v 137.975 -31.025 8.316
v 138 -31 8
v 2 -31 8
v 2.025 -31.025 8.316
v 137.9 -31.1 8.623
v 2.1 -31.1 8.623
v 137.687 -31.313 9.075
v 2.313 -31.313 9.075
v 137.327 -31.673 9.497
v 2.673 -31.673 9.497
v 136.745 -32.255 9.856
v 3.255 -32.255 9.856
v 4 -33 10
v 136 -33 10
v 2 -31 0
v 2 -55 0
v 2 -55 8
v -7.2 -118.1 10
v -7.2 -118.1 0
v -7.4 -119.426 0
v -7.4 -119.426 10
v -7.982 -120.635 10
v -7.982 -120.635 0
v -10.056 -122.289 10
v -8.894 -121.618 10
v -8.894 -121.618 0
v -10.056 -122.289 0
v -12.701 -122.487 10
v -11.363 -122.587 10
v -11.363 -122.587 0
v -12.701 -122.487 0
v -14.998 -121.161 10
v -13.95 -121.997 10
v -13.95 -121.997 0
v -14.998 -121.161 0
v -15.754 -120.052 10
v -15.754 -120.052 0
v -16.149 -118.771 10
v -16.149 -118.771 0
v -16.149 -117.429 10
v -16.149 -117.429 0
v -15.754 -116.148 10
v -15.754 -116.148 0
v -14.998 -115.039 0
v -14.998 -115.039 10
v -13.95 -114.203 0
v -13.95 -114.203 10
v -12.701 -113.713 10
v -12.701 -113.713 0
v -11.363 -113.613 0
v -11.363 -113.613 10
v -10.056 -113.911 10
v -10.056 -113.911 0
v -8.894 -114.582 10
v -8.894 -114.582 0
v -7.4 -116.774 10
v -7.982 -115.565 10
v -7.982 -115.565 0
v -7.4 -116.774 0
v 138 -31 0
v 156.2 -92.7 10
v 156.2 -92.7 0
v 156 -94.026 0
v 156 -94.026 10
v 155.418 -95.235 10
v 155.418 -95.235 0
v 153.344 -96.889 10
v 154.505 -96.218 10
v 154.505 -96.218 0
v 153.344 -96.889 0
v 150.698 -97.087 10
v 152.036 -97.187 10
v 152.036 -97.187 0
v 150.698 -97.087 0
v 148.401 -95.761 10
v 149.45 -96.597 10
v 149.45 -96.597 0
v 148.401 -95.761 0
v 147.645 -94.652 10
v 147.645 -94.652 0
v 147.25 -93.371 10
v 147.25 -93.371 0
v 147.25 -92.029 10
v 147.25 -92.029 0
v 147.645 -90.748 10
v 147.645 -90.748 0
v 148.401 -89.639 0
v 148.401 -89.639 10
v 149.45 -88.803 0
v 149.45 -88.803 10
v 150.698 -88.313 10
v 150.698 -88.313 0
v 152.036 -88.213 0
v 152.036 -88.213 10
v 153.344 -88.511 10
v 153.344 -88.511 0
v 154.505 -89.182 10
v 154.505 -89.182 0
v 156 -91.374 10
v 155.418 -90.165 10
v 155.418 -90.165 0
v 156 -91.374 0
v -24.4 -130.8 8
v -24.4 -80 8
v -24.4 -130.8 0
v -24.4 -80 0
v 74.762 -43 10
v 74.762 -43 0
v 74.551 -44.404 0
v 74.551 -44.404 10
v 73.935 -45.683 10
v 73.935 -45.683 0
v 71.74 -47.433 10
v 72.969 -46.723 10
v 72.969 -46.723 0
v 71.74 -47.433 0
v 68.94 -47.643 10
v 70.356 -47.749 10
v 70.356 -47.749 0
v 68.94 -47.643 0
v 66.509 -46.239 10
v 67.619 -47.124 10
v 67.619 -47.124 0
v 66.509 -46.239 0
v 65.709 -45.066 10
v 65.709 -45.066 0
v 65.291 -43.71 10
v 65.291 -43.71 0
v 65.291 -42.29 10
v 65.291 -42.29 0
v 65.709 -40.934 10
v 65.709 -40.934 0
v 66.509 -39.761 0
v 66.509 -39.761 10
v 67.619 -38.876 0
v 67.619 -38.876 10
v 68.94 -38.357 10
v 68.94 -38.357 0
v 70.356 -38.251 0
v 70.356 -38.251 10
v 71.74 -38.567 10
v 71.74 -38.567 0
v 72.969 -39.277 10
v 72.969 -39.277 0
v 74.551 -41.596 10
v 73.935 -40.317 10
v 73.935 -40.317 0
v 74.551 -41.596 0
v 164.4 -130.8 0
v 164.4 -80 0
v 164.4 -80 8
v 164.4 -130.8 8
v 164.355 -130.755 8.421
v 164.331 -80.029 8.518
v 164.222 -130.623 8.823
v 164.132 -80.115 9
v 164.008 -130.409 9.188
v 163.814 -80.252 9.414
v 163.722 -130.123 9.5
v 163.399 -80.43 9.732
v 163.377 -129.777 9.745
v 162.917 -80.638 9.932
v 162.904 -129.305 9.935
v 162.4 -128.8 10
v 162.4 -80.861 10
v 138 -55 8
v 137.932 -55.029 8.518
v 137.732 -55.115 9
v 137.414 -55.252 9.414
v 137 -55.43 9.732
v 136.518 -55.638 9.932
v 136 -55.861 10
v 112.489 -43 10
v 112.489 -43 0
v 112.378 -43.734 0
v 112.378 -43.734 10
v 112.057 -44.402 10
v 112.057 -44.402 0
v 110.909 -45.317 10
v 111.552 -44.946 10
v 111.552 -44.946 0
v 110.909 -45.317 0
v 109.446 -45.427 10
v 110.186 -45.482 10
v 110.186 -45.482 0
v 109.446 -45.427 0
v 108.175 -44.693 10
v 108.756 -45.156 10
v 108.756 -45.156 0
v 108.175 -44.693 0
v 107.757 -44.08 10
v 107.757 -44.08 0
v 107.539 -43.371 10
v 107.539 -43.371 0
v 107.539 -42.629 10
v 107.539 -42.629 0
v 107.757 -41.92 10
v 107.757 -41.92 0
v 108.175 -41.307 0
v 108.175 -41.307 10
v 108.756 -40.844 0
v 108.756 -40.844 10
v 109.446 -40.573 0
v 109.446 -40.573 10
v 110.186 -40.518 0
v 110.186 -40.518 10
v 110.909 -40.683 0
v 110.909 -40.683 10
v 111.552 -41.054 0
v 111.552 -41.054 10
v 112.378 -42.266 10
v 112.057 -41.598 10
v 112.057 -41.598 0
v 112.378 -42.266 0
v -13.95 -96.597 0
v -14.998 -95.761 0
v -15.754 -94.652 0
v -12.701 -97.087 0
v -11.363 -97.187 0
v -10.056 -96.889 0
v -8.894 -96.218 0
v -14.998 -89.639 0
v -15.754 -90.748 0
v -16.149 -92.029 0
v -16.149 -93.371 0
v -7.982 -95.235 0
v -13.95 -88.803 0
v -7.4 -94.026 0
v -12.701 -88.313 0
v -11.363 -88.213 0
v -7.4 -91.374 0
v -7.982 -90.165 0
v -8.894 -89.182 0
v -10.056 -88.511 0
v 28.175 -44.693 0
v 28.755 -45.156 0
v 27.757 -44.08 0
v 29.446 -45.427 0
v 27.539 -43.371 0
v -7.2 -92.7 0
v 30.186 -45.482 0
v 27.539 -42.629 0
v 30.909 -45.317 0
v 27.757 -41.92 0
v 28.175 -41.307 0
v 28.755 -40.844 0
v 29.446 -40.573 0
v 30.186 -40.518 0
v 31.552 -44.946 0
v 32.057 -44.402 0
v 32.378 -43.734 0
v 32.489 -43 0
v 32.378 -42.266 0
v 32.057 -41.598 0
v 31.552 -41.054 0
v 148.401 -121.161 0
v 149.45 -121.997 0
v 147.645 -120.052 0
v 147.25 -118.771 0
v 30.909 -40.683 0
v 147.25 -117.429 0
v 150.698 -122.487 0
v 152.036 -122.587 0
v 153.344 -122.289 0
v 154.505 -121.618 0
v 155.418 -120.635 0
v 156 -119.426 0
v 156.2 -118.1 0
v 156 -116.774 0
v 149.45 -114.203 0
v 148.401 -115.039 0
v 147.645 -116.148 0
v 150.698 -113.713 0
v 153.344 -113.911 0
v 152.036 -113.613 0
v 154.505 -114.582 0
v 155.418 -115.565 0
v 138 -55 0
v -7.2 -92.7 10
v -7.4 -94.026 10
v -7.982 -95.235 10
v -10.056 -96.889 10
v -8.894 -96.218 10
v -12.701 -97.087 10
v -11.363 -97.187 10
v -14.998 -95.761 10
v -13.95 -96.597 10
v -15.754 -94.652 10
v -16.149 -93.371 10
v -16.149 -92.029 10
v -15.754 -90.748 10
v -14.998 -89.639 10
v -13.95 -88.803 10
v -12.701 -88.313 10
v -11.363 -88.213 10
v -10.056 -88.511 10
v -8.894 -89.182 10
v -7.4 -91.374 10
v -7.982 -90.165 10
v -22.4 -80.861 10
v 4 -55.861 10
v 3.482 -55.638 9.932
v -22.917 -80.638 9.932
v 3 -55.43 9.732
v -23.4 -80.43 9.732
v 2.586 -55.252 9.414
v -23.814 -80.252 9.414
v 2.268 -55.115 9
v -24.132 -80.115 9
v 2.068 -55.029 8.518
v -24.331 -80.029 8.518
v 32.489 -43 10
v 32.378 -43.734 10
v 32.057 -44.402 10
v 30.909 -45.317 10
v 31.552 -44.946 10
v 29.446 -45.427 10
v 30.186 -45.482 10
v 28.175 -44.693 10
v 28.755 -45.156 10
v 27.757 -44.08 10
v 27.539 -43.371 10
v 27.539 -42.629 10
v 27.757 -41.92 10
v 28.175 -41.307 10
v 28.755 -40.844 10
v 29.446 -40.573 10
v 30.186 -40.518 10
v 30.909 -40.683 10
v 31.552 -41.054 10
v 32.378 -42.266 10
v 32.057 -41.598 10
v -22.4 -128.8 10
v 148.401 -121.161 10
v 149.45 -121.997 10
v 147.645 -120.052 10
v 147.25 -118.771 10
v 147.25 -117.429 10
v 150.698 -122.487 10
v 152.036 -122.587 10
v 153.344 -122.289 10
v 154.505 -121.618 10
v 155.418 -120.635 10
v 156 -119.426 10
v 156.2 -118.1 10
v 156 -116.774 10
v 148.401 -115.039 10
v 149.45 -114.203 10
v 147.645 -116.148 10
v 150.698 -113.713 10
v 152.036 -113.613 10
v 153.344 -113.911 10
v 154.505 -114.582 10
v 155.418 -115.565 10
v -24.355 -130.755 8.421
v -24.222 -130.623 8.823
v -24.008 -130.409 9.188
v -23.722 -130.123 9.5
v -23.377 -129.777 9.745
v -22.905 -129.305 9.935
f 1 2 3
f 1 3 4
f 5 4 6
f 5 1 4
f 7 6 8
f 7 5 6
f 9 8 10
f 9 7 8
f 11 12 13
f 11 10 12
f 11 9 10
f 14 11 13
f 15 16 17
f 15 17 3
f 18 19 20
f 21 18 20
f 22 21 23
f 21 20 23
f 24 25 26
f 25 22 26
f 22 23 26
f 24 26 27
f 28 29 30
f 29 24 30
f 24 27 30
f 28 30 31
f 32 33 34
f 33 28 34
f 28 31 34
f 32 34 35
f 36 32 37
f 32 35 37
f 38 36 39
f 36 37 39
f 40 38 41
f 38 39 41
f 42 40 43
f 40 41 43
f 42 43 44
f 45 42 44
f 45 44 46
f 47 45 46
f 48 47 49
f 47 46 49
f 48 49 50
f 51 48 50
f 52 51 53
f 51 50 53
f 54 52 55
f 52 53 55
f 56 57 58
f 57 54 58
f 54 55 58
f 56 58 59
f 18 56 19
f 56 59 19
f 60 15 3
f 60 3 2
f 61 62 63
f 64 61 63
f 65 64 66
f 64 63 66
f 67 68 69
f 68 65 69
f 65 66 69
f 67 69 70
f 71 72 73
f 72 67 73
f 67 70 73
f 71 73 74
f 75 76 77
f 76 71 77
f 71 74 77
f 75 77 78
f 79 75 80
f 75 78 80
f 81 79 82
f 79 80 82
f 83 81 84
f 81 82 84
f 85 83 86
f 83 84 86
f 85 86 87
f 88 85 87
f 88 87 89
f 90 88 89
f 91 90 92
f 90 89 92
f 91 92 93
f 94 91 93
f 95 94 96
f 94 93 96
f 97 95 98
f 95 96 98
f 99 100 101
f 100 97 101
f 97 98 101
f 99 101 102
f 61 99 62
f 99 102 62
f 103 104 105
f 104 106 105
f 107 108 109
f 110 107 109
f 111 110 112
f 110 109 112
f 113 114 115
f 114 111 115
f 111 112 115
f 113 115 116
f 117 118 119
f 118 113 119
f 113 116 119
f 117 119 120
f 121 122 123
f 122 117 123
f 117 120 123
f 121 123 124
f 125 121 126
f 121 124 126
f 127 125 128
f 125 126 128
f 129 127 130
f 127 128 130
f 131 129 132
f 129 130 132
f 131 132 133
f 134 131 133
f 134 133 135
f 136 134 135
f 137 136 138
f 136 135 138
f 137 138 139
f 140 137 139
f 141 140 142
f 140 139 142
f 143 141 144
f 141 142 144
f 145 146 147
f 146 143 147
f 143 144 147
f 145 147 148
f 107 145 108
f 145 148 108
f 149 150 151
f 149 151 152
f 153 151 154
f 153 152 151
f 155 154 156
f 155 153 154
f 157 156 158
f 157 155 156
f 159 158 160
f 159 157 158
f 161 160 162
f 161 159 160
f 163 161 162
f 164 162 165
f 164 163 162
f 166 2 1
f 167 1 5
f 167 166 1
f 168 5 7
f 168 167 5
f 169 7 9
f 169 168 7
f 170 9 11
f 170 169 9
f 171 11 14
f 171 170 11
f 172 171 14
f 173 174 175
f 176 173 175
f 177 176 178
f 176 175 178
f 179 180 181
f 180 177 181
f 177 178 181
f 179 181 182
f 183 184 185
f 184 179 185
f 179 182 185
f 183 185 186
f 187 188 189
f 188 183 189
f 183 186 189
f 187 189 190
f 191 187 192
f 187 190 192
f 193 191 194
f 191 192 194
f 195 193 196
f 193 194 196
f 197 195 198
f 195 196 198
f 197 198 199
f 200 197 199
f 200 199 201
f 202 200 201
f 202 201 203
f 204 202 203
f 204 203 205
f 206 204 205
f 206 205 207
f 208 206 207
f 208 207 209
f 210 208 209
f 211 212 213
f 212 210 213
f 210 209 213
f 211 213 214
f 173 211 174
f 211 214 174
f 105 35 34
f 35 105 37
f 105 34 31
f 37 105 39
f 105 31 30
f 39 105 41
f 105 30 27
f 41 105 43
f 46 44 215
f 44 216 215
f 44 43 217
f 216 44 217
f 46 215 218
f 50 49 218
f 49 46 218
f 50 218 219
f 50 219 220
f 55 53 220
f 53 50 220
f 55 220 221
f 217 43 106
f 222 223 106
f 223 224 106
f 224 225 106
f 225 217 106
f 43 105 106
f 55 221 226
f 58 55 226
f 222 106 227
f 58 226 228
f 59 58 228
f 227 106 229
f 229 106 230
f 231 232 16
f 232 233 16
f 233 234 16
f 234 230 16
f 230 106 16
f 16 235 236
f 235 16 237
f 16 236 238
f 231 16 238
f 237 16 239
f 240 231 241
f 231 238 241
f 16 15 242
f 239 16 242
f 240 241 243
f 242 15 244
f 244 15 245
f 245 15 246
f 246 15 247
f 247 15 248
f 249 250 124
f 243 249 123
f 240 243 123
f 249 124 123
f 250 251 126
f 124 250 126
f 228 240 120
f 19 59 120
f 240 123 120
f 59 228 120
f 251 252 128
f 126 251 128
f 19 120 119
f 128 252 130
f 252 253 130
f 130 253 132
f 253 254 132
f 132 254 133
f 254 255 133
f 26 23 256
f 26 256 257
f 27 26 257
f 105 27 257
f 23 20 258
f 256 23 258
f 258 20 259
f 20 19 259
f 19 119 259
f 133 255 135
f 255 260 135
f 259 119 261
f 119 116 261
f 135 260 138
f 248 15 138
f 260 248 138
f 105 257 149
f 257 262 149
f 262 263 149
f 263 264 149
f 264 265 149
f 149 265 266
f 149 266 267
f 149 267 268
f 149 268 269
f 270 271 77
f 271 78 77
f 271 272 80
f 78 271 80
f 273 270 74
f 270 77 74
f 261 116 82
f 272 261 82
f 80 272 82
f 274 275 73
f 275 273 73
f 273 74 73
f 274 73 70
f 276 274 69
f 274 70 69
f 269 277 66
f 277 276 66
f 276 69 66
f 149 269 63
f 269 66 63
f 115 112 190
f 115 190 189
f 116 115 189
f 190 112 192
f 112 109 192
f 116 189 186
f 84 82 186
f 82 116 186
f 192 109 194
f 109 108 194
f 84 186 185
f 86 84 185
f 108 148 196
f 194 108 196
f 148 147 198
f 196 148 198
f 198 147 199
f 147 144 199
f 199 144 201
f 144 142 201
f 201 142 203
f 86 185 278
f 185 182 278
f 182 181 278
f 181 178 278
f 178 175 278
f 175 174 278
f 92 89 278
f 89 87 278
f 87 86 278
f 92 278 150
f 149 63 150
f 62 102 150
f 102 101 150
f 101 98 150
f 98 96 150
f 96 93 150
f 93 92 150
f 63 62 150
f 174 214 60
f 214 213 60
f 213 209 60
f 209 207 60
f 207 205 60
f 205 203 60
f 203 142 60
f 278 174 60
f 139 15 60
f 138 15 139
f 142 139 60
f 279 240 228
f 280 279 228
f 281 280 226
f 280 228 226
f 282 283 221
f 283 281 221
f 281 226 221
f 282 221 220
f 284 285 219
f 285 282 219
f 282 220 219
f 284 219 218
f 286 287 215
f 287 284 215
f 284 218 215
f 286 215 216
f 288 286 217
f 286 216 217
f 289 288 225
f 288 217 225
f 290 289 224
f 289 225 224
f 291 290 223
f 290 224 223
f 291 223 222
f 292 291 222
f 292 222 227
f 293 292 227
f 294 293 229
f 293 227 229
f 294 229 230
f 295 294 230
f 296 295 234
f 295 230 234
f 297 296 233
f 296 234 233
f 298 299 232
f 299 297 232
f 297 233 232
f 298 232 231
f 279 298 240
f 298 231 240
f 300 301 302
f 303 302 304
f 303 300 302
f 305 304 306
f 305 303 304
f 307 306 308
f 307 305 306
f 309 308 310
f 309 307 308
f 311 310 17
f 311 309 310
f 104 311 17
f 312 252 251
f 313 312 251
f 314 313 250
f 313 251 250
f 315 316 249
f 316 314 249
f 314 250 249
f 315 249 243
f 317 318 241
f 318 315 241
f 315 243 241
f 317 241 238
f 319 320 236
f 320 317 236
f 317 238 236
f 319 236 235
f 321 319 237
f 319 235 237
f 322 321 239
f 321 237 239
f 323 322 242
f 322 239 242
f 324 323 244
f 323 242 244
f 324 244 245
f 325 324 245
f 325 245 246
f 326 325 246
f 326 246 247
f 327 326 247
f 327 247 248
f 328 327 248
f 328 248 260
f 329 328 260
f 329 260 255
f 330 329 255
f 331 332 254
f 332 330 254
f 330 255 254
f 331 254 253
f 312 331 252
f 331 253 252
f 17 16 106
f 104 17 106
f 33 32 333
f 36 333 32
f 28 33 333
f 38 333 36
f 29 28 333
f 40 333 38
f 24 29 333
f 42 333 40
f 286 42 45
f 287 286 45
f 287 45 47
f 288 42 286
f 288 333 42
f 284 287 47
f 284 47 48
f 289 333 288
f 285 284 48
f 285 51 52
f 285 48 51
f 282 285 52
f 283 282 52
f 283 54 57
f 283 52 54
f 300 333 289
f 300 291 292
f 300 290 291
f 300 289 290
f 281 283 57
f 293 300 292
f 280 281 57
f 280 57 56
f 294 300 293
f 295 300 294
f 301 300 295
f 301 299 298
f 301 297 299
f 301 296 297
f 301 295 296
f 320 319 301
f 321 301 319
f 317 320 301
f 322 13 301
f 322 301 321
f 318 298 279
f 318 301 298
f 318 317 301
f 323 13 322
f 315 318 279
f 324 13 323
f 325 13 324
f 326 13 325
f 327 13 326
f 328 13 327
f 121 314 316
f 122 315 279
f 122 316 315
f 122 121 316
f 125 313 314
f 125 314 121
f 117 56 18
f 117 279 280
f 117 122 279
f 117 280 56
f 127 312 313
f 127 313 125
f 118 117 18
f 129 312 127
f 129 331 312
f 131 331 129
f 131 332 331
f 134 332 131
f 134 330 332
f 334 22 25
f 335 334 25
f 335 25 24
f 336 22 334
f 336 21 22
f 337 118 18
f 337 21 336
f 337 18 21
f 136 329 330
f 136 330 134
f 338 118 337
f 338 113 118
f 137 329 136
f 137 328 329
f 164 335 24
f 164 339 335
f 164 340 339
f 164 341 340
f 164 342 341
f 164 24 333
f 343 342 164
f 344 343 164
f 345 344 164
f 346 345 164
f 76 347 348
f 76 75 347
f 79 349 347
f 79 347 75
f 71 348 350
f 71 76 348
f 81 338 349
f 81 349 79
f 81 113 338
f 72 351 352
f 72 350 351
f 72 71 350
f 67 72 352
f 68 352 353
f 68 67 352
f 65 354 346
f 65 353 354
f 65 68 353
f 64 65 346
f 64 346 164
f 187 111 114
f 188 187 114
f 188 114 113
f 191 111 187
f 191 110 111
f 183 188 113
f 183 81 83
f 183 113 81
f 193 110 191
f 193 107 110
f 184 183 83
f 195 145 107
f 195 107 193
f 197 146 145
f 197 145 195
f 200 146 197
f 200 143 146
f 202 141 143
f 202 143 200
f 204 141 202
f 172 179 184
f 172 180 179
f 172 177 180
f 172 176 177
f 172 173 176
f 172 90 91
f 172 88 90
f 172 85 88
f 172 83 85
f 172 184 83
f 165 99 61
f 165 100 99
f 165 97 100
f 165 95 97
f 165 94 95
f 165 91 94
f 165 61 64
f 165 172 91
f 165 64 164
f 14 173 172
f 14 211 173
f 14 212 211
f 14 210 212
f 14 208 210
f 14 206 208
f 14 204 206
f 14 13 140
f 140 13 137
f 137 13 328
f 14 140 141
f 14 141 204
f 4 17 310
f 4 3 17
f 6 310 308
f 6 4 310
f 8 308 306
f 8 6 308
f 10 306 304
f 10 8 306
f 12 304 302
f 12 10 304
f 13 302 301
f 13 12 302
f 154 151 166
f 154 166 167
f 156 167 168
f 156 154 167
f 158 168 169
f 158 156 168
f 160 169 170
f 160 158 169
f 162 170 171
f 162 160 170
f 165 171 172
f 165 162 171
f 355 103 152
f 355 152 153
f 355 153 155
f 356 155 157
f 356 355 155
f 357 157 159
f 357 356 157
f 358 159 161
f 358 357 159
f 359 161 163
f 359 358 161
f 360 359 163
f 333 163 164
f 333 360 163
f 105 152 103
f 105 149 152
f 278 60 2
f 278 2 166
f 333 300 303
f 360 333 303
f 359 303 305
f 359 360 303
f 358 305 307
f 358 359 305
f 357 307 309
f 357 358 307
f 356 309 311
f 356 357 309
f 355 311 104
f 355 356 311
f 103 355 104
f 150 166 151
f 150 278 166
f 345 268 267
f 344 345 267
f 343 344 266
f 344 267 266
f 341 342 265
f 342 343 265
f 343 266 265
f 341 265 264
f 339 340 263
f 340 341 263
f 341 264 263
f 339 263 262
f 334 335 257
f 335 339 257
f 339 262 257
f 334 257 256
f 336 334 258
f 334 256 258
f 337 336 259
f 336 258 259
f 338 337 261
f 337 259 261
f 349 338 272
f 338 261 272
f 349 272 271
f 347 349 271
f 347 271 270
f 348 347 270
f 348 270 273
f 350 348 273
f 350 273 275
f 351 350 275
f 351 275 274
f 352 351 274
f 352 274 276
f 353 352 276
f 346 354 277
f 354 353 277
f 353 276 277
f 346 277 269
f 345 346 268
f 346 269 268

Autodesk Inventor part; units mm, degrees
ref_plane "YZ Plane" through (0, 0, 0) normal (1, 0, 0) x (0, 1, 0)
ref_plane "XZ Plane" through (0, 0, 0) normal (0, 1, 0) x (-1, 0, 0)
ref_plane "Work Plane4" through (164.3995, -80, 0) normal (0, 0, 1) x (1, 0, 0)
sketch "Sketch1" plane through (164.3995, -80, 0) normal (0, 0, 1) x (1, 0, 0)
  circle A0 centre (-12.7, -38.1) radius 4.5 projected
  circle A1 centre (-12.7, -12.7) radius 4.5 projected
  circle A2 centre (-176.0991, -12.7) radius 4.5 projected
  circle A3 centre (-176.0991, -38.1) radius 4.5 projected
  line L0 (0, -50.8) -> (-188.7991, -50.8) projected
  line L1 (0, 0) -> (0, -50.8) projected
  line L2 (-188.7991, 0) -> (0, 0) projected
  line L3 (-188.7991, 0) -> (-188.7991, -50.8) projected
  circle A4 centre (-94.3995, 37) radius 4.7625
  circle A5 centre (-134.3995, 37) radius 2.489
  circle A6 centre (-54.3995, 37) radius 2.489
  line L4 (-26.3995, 25) -> (-162.3995, 25)
  line L5 (-26.3995, 49) -> (-26.3995, 25)
  line L6 (-162.3995, 49) -> (-26.3995, 49)
  line L7 (-162.3995, 25) -> (-162.3995, 49)
  line L8 (-26.3995, 25) -> (0, 0)
  line L9 (-162.3995, 25) -> (-188.7991, 0)
  point P0 (-94.3995, 0)
  dimension "d5" = 136
  dimension "d6" = 24
  dimension "d7" = 28
  dimension "d8" = 12
  dimension "d9" = 12
  dimension "d10" = 68
  dimension "d11" = 40
  dimension "d12" = 12
  dimension "d13" = 25
  dimension "d14" = 9.525
  dimension "d15" = 4.978
  dimension "d16" = 4.978
extrude "Extrusion1" add sketch "Sketch1" along normal blind 10
fillet "Fillet3" radius 2 8 edges at (70, -130.8, 10) (164.3995, -105.4, 10) (151.1998, -67.5, 10) (138, -43, 10) (70, -31, 10) (2, -43, 10) (-11.1998, -67.5, 10) (-24.3995, -105.4, 10)
properties part number "1136_RU Top Plate_V1" material "Aluminum"
